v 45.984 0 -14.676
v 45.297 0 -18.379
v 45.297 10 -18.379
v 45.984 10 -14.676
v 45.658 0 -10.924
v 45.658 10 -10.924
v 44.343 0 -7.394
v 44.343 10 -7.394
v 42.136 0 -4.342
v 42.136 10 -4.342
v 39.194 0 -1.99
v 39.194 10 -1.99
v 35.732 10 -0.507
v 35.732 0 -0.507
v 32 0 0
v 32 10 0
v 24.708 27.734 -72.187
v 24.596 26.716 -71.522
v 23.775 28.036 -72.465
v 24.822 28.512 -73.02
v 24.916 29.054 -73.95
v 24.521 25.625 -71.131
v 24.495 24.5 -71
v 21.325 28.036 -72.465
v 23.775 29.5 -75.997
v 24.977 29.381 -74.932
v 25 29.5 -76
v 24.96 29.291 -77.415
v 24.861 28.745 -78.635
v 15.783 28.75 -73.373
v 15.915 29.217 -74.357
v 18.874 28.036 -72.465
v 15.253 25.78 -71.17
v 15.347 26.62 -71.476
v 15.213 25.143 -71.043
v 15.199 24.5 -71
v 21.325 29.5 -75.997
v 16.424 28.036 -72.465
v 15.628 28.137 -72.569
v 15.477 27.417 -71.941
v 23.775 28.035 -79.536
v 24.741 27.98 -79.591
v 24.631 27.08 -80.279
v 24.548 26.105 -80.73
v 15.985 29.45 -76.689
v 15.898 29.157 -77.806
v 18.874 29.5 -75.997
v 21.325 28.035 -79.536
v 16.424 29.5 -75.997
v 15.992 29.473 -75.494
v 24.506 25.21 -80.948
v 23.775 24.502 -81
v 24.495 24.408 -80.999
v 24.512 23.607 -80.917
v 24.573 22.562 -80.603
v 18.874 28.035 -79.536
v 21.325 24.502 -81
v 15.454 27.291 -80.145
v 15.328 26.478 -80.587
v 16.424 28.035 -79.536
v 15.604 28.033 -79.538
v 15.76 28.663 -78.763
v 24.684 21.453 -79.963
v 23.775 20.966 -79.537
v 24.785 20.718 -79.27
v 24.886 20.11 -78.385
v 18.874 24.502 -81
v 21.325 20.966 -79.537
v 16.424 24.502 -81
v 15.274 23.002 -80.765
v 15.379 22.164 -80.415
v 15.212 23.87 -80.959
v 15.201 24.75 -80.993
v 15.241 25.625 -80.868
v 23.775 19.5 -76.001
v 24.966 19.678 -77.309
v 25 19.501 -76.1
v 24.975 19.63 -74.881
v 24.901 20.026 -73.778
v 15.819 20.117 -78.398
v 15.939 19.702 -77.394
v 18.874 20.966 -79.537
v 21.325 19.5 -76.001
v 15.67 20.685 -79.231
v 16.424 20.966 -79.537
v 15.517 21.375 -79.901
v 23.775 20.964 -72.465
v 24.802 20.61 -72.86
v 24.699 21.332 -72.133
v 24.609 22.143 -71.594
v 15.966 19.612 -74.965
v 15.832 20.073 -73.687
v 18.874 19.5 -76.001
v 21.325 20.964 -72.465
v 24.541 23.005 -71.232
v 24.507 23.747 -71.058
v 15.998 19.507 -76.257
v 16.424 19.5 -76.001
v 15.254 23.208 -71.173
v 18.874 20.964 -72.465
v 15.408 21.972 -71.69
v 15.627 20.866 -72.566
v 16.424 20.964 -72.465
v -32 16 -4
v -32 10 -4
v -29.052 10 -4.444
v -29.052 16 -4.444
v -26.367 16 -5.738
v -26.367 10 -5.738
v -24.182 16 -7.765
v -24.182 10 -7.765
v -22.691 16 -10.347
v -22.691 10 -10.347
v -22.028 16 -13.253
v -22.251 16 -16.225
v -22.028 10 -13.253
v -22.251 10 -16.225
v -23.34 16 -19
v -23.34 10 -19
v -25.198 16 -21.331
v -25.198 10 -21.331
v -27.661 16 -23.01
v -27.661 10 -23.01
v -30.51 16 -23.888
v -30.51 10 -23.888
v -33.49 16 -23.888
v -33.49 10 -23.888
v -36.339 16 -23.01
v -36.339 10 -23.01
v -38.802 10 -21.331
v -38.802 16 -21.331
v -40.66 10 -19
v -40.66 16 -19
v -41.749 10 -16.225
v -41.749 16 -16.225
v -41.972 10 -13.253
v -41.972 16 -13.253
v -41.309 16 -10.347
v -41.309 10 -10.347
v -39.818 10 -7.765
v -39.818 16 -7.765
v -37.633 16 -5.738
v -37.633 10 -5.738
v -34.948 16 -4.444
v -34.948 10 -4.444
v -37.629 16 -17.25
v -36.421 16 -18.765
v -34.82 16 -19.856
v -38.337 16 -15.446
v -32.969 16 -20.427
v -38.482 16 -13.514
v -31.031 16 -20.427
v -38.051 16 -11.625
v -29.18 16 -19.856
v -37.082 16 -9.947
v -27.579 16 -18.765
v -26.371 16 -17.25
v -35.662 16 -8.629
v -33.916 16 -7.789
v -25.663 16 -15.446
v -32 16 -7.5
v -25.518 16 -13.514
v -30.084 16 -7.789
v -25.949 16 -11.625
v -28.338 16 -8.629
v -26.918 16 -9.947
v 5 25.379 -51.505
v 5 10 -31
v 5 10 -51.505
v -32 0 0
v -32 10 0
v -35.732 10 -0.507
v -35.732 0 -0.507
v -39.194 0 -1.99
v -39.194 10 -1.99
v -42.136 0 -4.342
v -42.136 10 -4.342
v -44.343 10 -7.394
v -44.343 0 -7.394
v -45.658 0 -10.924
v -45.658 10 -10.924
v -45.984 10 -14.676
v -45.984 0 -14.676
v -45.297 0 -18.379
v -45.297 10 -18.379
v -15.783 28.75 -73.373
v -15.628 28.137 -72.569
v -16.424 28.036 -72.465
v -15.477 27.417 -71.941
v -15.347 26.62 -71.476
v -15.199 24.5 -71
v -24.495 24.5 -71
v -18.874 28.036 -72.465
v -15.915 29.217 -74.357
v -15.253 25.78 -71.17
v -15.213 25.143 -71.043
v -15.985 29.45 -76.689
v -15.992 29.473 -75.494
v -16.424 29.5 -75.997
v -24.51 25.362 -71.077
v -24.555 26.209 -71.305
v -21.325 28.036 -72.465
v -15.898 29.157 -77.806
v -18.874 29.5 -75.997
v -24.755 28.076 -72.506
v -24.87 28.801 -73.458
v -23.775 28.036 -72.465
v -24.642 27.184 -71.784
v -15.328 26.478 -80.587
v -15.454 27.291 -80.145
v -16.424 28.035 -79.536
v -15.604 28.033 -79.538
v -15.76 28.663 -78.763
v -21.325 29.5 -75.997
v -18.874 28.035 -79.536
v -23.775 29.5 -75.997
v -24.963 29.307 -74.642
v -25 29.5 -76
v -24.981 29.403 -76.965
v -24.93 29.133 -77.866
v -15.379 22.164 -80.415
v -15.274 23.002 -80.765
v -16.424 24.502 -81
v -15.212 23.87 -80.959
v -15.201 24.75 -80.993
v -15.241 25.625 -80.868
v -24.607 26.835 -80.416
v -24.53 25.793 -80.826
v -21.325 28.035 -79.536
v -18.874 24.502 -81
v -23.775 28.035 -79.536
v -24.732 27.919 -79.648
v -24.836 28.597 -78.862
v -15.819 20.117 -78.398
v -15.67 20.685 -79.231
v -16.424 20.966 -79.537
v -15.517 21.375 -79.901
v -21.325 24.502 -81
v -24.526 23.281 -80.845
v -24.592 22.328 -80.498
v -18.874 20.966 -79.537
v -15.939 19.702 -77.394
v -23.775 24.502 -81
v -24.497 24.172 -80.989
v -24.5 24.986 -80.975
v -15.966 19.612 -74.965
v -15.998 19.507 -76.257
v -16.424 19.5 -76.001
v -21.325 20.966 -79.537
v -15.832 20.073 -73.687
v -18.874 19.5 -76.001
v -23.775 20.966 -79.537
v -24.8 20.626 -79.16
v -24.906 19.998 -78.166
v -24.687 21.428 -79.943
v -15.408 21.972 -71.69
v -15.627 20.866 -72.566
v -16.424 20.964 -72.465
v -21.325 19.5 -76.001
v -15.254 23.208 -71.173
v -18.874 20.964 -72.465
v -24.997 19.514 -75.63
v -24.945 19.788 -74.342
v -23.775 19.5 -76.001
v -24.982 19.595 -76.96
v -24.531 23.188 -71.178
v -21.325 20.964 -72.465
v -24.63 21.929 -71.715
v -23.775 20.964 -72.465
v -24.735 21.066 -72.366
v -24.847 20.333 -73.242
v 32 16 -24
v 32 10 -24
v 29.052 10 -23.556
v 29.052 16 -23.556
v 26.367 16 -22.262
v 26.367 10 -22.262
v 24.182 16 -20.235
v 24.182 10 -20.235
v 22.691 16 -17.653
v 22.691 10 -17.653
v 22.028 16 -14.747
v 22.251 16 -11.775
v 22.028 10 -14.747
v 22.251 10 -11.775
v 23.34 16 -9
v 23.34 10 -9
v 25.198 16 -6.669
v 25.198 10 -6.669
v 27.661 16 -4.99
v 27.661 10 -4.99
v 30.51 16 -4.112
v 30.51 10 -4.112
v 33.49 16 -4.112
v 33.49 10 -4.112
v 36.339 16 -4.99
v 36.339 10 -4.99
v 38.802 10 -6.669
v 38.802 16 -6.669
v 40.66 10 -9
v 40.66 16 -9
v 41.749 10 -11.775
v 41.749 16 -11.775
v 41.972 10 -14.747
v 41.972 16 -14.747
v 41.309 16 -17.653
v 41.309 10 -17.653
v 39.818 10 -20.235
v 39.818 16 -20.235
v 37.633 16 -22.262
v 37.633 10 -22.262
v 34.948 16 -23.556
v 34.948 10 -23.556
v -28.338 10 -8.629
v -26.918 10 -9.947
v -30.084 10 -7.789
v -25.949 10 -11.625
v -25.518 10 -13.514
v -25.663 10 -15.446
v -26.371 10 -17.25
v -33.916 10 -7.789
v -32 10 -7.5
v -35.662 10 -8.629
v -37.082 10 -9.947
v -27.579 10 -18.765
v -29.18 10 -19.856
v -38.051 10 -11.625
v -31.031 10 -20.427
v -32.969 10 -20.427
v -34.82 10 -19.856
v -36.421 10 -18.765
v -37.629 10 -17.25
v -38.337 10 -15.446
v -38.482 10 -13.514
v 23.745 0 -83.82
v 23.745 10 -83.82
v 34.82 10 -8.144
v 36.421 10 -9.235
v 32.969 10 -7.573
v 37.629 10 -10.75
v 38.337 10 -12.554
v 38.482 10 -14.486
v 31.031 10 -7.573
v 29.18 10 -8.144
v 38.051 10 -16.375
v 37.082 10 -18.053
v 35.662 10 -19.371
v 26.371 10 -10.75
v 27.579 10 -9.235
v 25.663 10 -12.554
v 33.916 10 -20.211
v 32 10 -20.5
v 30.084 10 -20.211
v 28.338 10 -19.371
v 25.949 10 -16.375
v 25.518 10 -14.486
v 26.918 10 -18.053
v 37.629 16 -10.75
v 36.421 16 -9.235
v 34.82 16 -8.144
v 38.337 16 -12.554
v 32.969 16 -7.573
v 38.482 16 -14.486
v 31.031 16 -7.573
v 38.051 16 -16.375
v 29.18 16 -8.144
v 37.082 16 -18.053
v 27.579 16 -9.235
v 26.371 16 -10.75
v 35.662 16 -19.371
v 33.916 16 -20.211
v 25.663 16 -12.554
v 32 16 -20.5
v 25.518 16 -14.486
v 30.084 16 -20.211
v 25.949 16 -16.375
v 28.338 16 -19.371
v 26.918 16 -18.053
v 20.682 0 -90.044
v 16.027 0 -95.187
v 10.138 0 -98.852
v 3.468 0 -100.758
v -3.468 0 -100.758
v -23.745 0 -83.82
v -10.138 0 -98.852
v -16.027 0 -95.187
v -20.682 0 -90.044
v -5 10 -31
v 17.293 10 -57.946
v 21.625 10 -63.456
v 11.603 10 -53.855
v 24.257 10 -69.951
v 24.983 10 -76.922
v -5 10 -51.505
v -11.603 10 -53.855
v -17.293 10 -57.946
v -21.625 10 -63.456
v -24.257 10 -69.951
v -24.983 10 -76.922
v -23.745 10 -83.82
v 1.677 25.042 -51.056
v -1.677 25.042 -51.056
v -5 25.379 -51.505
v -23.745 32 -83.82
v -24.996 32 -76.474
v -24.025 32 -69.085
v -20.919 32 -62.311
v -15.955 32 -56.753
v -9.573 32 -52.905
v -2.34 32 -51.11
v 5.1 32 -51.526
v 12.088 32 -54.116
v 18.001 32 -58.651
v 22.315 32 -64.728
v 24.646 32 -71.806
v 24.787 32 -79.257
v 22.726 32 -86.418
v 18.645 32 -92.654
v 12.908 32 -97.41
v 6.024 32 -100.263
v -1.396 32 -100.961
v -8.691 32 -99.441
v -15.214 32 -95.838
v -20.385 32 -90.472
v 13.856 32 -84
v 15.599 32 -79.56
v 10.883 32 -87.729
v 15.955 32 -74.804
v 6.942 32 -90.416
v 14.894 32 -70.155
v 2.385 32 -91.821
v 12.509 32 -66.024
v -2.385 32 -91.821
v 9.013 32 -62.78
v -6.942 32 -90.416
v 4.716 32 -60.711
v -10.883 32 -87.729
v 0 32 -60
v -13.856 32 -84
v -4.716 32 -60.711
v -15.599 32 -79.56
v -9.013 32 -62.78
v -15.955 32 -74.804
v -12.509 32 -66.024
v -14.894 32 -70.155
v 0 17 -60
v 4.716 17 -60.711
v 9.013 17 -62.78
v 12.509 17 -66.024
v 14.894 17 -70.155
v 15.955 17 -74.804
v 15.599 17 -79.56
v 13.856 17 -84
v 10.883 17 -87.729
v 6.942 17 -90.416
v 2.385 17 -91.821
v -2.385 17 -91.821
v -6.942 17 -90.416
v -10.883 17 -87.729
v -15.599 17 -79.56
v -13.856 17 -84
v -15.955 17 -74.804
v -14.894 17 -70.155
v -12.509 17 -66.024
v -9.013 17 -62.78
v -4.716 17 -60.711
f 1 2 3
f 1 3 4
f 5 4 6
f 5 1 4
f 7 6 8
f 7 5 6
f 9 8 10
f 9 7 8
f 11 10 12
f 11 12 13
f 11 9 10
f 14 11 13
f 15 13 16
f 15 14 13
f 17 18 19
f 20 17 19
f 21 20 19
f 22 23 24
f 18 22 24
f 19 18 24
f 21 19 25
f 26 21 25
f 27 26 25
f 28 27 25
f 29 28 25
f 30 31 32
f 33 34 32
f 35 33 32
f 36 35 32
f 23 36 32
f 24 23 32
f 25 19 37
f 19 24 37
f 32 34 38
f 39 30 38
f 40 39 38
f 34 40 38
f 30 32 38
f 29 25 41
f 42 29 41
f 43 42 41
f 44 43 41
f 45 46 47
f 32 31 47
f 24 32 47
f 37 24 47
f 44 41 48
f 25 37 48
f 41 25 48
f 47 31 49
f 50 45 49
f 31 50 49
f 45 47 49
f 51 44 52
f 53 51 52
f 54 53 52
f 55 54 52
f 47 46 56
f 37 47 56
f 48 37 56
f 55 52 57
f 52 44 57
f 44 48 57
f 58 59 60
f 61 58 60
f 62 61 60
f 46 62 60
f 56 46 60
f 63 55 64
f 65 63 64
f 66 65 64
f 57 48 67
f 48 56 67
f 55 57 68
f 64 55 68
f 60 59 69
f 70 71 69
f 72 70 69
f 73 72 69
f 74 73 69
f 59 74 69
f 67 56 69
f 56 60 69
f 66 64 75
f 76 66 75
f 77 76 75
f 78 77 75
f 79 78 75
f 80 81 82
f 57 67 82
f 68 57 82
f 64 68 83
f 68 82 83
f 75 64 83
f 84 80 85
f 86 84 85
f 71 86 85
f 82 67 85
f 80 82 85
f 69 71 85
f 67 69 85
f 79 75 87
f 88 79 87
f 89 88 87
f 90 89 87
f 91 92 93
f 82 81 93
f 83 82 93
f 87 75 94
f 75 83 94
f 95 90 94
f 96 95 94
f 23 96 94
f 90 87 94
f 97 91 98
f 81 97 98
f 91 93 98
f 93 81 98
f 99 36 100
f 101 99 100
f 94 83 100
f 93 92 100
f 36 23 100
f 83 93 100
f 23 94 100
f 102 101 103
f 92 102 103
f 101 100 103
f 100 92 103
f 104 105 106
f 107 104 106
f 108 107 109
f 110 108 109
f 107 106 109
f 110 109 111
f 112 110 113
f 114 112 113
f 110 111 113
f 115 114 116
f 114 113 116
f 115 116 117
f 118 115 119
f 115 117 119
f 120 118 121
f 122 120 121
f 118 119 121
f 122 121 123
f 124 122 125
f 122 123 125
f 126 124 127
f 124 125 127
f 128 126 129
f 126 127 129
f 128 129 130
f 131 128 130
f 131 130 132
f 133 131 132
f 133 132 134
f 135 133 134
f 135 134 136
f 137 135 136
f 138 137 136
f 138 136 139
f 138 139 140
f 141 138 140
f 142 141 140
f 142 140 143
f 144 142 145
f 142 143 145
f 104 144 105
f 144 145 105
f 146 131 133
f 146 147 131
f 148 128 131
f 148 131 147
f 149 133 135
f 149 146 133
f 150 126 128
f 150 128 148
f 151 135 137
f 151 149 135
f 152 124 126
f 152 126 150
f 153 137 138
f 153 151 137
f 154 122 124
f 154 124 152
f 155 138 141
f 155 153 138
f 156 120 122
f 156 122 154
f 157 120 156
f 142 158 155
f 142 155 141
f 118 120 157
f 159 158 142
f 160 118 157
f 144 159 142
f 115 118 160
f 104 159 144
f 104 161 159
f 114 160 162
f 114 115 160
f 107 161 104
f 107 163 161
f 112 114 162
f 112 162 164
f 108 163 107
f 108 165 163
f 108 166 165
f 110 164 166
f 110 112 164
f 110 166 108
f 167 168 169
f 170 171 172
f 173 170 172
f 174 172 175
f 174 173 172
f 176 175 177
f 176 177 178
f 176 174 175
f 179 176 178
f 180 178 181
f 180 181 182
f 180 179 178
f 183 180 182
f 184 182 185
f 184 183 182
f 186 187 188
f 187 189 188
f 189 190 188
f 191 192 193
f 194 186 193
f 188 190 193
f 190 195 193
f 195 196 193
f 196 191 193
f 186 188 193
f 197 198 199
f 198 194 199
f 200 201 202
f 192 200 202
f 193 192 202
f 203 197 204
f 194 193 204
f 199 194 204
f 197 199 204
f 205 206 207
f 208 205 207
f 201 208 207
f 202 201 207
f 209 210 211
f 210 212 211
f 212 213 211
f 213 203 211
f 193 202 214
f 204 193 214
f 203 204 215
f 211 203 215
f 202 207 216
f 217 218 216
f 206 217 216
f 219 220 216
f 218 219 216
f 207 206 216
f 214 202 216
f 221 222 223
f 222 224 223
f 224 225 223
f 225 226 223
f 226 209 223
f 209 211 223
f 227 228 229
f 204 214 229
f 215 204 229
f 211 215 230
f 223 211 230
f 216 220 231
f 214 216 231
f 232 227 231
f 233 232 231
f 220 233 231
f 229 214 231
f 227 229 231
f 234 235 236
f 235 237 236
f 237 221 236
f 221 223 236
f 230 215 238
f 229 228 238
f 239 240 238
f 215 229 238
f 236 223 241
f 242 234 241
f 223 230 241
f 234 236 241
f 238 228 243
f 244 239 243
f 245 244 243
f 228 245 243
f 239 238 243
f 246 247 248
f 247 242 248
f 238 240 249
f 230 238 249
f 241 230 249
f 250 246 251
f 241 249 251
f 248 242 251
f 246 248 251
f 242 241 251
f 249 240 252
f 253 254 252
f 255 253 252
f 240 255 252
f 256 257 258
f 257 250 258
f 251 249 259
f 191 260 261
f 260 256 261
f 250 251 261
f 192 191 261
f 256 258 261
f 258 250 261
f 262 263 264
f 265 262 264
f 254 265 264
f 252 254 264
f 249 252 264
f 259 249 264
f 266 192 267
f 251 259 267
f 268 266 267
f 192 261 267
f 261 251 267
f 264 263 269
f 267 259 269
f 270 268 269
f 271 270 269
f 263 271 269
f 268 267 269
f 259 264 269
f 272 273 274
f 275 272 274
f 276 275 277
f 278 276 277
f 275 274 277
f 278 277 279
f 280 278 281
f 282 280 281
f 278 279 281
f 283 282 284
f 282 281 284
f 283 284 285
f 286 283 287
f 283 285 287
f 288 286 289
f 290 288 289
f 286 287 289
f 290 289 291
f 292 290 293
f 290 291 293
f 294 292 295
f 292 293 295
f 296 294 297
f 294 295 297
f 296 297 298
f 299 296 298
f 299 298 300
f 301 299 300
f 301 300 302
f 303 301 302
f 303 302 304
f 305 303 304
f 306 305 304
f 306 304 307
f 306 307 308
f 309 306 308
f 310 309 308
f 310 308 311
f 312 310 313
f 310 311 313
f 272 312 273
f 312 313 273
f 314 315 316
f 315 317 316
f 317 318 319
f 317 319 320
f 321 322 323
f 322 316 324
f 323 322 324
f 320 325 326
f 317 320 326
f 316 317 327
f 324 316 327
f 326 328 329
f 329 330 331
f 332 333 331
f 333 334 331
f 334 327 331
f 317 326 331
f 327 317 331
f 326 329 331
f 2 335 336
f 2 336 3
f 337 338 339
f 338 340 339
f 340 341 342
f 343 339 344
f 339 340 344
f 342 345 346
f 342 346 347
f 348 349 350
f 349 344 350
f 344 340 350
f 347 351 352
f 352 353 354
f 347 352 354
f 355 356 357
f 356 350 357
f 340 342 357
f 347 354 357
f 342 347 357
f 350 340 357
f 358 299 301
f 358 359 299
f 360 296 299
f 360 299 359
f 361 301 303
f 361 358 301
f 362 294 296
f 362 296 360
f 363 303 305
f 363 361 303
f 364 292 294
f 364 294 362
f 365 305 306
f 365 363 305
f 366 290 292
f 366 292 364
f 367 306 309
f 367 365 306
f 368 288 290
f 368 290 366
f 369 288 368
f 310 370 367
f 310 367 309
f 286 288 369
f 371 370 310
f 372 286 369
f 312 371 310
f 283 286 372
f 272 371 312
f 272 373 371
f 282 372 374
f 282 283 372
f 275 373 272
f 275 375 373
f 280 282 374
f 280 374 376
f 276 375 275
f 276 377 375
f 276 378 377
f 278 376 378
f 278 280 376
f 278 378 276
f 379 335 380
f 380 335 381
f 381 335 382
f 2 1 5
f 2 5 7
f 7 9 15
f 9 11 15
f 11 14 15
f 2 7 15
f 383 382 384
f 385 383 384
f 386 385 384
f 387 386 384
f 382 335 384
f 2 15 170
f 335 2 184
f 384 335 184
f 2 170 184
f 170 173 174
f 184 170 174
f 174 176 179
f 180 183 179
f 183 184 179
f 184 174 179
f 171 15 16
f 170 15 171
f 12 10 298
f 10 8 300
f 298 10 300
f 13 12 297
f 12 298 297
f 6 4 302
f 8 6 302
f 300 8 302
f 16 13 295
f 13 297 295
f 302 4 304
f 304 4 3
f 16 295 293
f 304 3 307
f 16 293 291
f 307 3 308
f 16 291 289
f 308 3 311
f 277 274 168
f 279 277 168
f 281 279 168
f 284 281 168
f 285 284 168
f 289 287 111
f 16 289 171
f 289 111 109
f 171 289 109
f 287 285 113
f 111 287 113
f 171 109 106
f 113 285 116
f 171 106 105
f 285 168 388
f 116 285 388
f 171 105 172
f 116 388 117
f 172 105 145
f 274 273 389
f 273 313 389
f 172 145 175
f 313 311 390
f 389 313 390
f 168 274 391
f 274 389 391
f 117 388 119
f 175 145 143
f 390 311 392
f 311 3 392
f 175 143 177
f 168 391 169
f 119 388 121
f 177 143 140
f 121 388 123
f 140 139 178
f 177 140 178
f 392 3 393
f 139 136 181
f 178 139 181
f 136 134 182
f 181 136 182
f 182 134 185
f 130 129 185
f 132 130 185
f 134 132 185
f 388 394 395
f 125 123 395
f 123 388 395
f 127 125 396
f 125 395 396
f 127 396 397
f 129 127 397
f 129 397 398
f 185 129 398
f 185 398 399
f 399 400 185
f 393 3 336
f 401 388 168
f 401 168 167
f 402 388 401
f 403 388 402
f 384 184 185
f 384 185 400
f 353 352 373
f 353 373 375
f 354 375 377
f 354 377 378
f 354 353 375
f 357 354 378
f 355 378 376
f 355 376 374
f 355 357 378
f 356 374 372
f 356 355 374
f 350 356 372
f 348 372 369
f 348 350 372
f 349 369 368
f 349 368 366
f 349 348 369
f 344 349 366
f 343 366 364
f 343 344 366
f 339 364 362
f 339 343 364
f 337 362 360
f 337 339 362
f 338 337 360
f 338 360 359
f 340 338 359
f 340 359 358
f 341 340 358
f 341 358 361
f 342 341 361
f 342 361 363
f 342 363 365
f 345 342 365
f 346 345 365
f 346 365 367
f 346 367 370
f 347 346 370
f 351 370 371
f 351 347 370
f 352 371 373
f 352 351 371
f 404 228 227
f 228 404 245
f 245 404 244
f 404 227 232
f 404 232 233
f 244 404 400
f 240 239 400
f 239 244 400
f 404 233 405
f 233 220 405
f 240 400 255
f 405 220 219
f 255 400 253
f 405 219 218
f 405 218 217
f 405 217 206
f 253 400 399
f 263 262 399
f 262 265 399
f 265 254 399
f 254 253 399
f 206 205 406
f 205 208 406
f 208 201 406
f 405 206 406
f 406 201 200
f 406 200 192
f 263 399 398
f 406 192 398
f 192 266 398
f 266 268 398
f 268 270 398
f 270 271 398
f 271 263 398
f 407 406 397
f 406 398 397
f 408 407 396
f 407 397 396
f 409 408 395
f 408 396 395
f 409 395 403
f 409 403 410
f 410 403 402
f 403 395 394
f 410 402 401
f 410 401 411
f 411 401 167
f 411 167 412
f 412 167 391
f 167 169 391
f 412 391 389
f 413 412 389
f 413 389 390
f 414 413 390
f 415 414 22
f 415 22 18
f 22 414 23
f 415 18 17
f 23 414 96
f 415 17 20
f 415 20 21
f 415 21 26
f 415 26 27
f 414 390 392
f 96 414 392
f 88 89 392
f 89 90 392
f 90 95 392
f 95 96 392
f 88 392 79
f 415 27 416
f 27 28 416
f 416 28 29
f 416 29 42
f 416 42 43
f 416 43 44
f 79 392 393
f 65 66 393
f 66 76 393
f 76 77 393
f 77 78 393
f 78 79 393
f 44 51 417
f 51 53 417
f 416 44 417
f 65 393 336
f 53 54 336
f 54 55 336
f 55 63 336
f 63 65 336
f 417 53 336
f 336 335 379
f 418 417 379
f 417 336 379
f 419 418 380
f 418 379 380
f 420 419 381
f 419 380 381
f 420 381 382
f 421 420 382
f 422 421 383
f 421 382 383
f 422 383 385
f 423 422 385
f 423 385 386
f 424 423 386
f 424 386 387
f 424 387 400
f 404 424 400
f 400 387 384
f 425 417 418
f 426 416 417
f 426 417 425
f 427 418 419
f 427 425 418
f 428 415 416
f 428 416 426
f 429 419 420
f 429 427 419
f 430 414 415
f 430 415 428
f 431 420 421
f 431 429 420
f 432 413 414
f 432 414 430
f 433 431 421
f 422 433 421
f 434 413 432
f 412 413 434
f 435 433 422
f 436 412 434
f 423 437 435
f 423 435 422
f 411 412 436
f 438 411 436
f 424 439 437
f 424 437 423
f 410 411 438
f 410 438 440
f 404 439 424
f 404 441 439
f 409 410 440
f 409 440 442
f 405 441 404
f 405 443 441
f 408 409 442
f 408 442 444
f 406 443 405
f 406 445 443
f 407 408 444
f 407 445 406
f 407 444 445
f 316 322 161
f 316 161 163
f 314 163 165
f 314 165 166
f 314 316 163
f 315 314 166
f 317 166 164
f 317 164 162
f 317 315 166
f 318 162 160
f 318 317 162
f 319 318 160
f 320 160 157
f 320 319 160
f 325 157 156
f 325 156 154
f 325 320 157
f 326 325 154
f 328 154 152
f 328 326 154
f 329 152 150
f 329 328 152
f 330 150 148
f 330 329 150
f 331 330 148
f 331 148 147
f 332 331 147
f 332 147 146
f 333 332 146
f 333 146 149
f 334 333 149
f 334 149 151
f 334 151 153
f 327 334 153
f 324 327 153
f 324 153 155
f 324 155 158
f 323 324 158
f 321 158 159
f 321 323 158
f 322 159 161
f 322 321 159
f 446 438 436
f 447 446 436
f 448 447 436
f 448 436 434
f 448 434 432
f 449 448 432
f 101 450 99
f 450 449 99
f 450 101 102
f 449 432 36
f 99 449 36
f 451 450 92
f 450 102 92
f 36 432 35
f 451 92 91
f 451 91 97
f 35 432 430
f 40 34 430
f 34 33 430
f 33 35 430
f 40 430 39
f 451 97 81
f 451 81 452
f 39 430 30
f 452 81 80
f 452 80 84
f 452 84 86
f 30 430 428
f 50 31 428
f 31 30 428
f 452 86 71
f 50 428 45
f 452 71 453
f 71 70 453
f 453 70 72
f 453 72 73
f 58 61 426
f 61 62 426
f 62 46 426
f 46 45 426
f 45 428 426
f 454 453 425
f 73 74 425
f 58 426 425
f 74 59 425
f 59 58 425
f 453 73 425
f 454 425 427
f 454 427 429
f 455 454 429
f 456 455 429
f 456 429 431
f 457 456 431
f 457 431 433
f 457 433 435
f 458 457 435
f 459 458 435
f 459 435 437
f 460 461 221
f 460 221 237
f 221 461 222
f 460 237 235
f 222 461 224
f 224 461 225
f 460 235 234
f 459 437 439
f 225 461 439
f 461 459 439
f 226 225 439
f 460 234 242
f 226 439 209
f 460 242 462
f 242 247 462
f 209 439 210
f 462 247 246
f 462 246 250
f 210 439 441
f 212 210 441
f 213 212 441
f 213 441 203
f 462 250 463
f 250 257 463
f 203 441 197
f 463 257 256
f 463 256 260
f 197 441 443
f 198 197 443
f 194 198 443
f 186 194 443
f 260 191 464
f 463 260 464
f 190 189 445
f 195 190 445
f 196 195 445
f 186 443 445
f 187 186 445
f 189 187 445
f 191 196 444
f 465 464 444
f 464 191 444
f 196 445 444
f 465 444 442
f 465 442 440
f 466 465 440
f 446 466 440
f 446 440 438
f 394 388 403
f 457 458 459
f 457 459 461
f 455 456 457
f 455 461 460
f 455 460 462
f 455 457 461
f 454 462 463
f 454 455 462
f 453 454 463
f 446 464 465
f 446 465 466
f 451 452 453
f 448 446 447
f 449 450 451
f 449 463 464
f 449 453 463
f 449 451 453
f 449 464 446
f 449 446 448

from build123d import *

# Parameters (mm, degrees)
SALIENTE_EXTRUIR1_DEPTH = 10
CROQUIS2_R              = 25
SALIENTE_EXTRUIR3_DEPTH = 32
CROQUIS4_R              = 16
CORTAR_EXTRUIR1_DEPTH   = 15
CORTAR_EXTRUIR2_START   = -25.000000112
CORTAR_EXTRUIR2_DEPTH   = 50.000000224
NERVIO1_REACH           = 117.503
CROQUIS8_WALL_W         = 258.006455054
CROQUIS8_WALL_H         = 10
CROQUIS9_R              = 10
CROQUIS9_R_2            = 6.5
SALIENTE_EXTRUIR4_DEPTH = 6


# Read off the part's stored shape, not the designer's step: Cortar-Extruir2
with BuildPart() as part:
    # Croquis1 → Saliente-Extruir1 (new body)
    with BuildSketch(Plane(origin=(0, 0, 0), x_dir=(1, 0, 0), z_dir=(0, 1, 0))):
        with BuildLine():
            Line((-45.297427526, 18.379317433), (-23.745406297, 83.820209702))
            ThreePointArc((-23.745406297, 83.820209702), (0, 51), (23.745406297, 83.820209702))
            Line((23.745406297, 83.820209702), (45.297427526, 18.379317433))
            ThreePointArc((45.297427526, 18.379317433), (43.342628533, 5.793613586), (32, 0))
            Line((32, 0), (-32, 0))
            ThreePointArc((-32, 0), (-43.342628533, 5.793613586), (-45.297427526, 18.379317433))
        make_face()
    extrude(amount=SALIENTE_EXTRUIR1_DEPTH)

    # Croquis2 → Saliente-Extruir3 (add)
    with BuildSketch(Plane(origin=(0, 0, 0), x_dir=(1, 0, 0), z_dir=(0, 1, 0))):
        with Locations(Location((0, 76, 0), (0, 0, 161.771441232))):
            Circle(CROQUIS2_R)
    extrude(amount=SALIENTE_EXTRUIR3_DEPTH)

    # Croquis4 → Cortar-Extruir1 (cut)
    with BuildSketch(Plane(origin=(0, 32, 0), x_dir=(1, 0, 0), z_dir=(0, 1, 0))):
        with Locations(Location((0, 76, 0), (0, 0, 270))):
            Circle(CROQUIS4_R)
    extrude(amount=-CORTAR_EXTRUIR1_DEPTH, mode=Mode.SUBTRACT)

    # Cortar-Extruir2 outline → Cortar-Extruir2 (cut)
    with BuildSketch(Plane(origin=(0, 0, 0), x_dir=(0, 0, -1), z_dir=(1, 0, 0)).offset(CORTAR_EXTRUIR2_START)):
        with BuildLine():
            add(Edge.make_bspline(
                [(71, 24.5), (71, 25.830324865), (71.548602551, 27.119839879), (73.380983998, 28.951882233), (74.682846227, 29.499135225), (77.310580087, 29.500862615), (78.614537315, 28.956974901), (80.458235075, 27.112387922), (80.999440282, 25.812671971), (81.000558807, 23.191595456), (80.460035839, 21.889945603), (78.61477129, 20.042727881), (77.319144976, 19.500263352), (74.682852162, 19.499736848), (73.382124852, 20.047206111), (71.548344872, 21.880188876), (71, 23.169675135), (71, 24.5)],
                knots=[0, 0, 0, 0, 0.125, 0.125, 0.25, 0.25, 0.375, 0.375, 0.5, 0.5, 0.625, 0.625, 0.75, 0.75, 0.875, 0.875, 1, 1, 1, 1], degree=3))
        make_face()
    extrude(amount=CORTAR_EXTRUIR2_DEPTH, mode=Mode.SUBTRACT)

    # Croquis8 wall → Nervio1 (add, up to next)
    with BuildSketch(Plane(origin=(0, 17.5, -41.00002412), x_dir=(0, 0.600000926209, -0.799999305342), z_dir=(0, 0.799999305342, 0.600000926209)), mode=Mode.PRIVATE) as nervio1_sk1:
        Rectangle(CROQUIS8_WALL_W, CROQUIS8_WALL_H)
    nervio1_tool1 = extrude(nervio1_sk1.sketch, amount=-NERVIO1_REACH, mode=Mode.PRIVATE) - part.part
    add(nervio1_tool1.solids().sort_by_distance((0, 17.5, -41.00002412))[0])

    # Croquis9 → Saliente-Extruir4 (add)
    # profile 1 of 2: a face of its own
    with BuildSketch(Plane(origin=(0, 10, 0), x_dir=(1, 0, 0), z_dir=(0, 1, 0))):
        with Locations(Location((-32, 14, 0), (0, 0, 270))):
            Circle(CROQUIS9_R)
        with Locations(Location((-32, 14, 0), (0, 0, 270))):
            Circle(CROQUIS9_R_2, mode=Mode.SUBTRACT)
    # profile 2 of 2: a face of its own
    with BuildSketch(Plane(origin=(0, 10, 0), x_dir=(1, 0, 0), z_dir=(0, 1, 0))):
        with Locations(Location((32, 14, 0), (0, 0, 90))):
            Circle(CROQUIS9_R)
        with Locations(Location((32, 14, 0), (0, 0, 90))):
            Circle(CROQUIS9_R_2, mode=Mode.SUBTRACT)
    extrude(amount=SALIENTE_EXTRUIR4_DEPTH)


solid = part.part
